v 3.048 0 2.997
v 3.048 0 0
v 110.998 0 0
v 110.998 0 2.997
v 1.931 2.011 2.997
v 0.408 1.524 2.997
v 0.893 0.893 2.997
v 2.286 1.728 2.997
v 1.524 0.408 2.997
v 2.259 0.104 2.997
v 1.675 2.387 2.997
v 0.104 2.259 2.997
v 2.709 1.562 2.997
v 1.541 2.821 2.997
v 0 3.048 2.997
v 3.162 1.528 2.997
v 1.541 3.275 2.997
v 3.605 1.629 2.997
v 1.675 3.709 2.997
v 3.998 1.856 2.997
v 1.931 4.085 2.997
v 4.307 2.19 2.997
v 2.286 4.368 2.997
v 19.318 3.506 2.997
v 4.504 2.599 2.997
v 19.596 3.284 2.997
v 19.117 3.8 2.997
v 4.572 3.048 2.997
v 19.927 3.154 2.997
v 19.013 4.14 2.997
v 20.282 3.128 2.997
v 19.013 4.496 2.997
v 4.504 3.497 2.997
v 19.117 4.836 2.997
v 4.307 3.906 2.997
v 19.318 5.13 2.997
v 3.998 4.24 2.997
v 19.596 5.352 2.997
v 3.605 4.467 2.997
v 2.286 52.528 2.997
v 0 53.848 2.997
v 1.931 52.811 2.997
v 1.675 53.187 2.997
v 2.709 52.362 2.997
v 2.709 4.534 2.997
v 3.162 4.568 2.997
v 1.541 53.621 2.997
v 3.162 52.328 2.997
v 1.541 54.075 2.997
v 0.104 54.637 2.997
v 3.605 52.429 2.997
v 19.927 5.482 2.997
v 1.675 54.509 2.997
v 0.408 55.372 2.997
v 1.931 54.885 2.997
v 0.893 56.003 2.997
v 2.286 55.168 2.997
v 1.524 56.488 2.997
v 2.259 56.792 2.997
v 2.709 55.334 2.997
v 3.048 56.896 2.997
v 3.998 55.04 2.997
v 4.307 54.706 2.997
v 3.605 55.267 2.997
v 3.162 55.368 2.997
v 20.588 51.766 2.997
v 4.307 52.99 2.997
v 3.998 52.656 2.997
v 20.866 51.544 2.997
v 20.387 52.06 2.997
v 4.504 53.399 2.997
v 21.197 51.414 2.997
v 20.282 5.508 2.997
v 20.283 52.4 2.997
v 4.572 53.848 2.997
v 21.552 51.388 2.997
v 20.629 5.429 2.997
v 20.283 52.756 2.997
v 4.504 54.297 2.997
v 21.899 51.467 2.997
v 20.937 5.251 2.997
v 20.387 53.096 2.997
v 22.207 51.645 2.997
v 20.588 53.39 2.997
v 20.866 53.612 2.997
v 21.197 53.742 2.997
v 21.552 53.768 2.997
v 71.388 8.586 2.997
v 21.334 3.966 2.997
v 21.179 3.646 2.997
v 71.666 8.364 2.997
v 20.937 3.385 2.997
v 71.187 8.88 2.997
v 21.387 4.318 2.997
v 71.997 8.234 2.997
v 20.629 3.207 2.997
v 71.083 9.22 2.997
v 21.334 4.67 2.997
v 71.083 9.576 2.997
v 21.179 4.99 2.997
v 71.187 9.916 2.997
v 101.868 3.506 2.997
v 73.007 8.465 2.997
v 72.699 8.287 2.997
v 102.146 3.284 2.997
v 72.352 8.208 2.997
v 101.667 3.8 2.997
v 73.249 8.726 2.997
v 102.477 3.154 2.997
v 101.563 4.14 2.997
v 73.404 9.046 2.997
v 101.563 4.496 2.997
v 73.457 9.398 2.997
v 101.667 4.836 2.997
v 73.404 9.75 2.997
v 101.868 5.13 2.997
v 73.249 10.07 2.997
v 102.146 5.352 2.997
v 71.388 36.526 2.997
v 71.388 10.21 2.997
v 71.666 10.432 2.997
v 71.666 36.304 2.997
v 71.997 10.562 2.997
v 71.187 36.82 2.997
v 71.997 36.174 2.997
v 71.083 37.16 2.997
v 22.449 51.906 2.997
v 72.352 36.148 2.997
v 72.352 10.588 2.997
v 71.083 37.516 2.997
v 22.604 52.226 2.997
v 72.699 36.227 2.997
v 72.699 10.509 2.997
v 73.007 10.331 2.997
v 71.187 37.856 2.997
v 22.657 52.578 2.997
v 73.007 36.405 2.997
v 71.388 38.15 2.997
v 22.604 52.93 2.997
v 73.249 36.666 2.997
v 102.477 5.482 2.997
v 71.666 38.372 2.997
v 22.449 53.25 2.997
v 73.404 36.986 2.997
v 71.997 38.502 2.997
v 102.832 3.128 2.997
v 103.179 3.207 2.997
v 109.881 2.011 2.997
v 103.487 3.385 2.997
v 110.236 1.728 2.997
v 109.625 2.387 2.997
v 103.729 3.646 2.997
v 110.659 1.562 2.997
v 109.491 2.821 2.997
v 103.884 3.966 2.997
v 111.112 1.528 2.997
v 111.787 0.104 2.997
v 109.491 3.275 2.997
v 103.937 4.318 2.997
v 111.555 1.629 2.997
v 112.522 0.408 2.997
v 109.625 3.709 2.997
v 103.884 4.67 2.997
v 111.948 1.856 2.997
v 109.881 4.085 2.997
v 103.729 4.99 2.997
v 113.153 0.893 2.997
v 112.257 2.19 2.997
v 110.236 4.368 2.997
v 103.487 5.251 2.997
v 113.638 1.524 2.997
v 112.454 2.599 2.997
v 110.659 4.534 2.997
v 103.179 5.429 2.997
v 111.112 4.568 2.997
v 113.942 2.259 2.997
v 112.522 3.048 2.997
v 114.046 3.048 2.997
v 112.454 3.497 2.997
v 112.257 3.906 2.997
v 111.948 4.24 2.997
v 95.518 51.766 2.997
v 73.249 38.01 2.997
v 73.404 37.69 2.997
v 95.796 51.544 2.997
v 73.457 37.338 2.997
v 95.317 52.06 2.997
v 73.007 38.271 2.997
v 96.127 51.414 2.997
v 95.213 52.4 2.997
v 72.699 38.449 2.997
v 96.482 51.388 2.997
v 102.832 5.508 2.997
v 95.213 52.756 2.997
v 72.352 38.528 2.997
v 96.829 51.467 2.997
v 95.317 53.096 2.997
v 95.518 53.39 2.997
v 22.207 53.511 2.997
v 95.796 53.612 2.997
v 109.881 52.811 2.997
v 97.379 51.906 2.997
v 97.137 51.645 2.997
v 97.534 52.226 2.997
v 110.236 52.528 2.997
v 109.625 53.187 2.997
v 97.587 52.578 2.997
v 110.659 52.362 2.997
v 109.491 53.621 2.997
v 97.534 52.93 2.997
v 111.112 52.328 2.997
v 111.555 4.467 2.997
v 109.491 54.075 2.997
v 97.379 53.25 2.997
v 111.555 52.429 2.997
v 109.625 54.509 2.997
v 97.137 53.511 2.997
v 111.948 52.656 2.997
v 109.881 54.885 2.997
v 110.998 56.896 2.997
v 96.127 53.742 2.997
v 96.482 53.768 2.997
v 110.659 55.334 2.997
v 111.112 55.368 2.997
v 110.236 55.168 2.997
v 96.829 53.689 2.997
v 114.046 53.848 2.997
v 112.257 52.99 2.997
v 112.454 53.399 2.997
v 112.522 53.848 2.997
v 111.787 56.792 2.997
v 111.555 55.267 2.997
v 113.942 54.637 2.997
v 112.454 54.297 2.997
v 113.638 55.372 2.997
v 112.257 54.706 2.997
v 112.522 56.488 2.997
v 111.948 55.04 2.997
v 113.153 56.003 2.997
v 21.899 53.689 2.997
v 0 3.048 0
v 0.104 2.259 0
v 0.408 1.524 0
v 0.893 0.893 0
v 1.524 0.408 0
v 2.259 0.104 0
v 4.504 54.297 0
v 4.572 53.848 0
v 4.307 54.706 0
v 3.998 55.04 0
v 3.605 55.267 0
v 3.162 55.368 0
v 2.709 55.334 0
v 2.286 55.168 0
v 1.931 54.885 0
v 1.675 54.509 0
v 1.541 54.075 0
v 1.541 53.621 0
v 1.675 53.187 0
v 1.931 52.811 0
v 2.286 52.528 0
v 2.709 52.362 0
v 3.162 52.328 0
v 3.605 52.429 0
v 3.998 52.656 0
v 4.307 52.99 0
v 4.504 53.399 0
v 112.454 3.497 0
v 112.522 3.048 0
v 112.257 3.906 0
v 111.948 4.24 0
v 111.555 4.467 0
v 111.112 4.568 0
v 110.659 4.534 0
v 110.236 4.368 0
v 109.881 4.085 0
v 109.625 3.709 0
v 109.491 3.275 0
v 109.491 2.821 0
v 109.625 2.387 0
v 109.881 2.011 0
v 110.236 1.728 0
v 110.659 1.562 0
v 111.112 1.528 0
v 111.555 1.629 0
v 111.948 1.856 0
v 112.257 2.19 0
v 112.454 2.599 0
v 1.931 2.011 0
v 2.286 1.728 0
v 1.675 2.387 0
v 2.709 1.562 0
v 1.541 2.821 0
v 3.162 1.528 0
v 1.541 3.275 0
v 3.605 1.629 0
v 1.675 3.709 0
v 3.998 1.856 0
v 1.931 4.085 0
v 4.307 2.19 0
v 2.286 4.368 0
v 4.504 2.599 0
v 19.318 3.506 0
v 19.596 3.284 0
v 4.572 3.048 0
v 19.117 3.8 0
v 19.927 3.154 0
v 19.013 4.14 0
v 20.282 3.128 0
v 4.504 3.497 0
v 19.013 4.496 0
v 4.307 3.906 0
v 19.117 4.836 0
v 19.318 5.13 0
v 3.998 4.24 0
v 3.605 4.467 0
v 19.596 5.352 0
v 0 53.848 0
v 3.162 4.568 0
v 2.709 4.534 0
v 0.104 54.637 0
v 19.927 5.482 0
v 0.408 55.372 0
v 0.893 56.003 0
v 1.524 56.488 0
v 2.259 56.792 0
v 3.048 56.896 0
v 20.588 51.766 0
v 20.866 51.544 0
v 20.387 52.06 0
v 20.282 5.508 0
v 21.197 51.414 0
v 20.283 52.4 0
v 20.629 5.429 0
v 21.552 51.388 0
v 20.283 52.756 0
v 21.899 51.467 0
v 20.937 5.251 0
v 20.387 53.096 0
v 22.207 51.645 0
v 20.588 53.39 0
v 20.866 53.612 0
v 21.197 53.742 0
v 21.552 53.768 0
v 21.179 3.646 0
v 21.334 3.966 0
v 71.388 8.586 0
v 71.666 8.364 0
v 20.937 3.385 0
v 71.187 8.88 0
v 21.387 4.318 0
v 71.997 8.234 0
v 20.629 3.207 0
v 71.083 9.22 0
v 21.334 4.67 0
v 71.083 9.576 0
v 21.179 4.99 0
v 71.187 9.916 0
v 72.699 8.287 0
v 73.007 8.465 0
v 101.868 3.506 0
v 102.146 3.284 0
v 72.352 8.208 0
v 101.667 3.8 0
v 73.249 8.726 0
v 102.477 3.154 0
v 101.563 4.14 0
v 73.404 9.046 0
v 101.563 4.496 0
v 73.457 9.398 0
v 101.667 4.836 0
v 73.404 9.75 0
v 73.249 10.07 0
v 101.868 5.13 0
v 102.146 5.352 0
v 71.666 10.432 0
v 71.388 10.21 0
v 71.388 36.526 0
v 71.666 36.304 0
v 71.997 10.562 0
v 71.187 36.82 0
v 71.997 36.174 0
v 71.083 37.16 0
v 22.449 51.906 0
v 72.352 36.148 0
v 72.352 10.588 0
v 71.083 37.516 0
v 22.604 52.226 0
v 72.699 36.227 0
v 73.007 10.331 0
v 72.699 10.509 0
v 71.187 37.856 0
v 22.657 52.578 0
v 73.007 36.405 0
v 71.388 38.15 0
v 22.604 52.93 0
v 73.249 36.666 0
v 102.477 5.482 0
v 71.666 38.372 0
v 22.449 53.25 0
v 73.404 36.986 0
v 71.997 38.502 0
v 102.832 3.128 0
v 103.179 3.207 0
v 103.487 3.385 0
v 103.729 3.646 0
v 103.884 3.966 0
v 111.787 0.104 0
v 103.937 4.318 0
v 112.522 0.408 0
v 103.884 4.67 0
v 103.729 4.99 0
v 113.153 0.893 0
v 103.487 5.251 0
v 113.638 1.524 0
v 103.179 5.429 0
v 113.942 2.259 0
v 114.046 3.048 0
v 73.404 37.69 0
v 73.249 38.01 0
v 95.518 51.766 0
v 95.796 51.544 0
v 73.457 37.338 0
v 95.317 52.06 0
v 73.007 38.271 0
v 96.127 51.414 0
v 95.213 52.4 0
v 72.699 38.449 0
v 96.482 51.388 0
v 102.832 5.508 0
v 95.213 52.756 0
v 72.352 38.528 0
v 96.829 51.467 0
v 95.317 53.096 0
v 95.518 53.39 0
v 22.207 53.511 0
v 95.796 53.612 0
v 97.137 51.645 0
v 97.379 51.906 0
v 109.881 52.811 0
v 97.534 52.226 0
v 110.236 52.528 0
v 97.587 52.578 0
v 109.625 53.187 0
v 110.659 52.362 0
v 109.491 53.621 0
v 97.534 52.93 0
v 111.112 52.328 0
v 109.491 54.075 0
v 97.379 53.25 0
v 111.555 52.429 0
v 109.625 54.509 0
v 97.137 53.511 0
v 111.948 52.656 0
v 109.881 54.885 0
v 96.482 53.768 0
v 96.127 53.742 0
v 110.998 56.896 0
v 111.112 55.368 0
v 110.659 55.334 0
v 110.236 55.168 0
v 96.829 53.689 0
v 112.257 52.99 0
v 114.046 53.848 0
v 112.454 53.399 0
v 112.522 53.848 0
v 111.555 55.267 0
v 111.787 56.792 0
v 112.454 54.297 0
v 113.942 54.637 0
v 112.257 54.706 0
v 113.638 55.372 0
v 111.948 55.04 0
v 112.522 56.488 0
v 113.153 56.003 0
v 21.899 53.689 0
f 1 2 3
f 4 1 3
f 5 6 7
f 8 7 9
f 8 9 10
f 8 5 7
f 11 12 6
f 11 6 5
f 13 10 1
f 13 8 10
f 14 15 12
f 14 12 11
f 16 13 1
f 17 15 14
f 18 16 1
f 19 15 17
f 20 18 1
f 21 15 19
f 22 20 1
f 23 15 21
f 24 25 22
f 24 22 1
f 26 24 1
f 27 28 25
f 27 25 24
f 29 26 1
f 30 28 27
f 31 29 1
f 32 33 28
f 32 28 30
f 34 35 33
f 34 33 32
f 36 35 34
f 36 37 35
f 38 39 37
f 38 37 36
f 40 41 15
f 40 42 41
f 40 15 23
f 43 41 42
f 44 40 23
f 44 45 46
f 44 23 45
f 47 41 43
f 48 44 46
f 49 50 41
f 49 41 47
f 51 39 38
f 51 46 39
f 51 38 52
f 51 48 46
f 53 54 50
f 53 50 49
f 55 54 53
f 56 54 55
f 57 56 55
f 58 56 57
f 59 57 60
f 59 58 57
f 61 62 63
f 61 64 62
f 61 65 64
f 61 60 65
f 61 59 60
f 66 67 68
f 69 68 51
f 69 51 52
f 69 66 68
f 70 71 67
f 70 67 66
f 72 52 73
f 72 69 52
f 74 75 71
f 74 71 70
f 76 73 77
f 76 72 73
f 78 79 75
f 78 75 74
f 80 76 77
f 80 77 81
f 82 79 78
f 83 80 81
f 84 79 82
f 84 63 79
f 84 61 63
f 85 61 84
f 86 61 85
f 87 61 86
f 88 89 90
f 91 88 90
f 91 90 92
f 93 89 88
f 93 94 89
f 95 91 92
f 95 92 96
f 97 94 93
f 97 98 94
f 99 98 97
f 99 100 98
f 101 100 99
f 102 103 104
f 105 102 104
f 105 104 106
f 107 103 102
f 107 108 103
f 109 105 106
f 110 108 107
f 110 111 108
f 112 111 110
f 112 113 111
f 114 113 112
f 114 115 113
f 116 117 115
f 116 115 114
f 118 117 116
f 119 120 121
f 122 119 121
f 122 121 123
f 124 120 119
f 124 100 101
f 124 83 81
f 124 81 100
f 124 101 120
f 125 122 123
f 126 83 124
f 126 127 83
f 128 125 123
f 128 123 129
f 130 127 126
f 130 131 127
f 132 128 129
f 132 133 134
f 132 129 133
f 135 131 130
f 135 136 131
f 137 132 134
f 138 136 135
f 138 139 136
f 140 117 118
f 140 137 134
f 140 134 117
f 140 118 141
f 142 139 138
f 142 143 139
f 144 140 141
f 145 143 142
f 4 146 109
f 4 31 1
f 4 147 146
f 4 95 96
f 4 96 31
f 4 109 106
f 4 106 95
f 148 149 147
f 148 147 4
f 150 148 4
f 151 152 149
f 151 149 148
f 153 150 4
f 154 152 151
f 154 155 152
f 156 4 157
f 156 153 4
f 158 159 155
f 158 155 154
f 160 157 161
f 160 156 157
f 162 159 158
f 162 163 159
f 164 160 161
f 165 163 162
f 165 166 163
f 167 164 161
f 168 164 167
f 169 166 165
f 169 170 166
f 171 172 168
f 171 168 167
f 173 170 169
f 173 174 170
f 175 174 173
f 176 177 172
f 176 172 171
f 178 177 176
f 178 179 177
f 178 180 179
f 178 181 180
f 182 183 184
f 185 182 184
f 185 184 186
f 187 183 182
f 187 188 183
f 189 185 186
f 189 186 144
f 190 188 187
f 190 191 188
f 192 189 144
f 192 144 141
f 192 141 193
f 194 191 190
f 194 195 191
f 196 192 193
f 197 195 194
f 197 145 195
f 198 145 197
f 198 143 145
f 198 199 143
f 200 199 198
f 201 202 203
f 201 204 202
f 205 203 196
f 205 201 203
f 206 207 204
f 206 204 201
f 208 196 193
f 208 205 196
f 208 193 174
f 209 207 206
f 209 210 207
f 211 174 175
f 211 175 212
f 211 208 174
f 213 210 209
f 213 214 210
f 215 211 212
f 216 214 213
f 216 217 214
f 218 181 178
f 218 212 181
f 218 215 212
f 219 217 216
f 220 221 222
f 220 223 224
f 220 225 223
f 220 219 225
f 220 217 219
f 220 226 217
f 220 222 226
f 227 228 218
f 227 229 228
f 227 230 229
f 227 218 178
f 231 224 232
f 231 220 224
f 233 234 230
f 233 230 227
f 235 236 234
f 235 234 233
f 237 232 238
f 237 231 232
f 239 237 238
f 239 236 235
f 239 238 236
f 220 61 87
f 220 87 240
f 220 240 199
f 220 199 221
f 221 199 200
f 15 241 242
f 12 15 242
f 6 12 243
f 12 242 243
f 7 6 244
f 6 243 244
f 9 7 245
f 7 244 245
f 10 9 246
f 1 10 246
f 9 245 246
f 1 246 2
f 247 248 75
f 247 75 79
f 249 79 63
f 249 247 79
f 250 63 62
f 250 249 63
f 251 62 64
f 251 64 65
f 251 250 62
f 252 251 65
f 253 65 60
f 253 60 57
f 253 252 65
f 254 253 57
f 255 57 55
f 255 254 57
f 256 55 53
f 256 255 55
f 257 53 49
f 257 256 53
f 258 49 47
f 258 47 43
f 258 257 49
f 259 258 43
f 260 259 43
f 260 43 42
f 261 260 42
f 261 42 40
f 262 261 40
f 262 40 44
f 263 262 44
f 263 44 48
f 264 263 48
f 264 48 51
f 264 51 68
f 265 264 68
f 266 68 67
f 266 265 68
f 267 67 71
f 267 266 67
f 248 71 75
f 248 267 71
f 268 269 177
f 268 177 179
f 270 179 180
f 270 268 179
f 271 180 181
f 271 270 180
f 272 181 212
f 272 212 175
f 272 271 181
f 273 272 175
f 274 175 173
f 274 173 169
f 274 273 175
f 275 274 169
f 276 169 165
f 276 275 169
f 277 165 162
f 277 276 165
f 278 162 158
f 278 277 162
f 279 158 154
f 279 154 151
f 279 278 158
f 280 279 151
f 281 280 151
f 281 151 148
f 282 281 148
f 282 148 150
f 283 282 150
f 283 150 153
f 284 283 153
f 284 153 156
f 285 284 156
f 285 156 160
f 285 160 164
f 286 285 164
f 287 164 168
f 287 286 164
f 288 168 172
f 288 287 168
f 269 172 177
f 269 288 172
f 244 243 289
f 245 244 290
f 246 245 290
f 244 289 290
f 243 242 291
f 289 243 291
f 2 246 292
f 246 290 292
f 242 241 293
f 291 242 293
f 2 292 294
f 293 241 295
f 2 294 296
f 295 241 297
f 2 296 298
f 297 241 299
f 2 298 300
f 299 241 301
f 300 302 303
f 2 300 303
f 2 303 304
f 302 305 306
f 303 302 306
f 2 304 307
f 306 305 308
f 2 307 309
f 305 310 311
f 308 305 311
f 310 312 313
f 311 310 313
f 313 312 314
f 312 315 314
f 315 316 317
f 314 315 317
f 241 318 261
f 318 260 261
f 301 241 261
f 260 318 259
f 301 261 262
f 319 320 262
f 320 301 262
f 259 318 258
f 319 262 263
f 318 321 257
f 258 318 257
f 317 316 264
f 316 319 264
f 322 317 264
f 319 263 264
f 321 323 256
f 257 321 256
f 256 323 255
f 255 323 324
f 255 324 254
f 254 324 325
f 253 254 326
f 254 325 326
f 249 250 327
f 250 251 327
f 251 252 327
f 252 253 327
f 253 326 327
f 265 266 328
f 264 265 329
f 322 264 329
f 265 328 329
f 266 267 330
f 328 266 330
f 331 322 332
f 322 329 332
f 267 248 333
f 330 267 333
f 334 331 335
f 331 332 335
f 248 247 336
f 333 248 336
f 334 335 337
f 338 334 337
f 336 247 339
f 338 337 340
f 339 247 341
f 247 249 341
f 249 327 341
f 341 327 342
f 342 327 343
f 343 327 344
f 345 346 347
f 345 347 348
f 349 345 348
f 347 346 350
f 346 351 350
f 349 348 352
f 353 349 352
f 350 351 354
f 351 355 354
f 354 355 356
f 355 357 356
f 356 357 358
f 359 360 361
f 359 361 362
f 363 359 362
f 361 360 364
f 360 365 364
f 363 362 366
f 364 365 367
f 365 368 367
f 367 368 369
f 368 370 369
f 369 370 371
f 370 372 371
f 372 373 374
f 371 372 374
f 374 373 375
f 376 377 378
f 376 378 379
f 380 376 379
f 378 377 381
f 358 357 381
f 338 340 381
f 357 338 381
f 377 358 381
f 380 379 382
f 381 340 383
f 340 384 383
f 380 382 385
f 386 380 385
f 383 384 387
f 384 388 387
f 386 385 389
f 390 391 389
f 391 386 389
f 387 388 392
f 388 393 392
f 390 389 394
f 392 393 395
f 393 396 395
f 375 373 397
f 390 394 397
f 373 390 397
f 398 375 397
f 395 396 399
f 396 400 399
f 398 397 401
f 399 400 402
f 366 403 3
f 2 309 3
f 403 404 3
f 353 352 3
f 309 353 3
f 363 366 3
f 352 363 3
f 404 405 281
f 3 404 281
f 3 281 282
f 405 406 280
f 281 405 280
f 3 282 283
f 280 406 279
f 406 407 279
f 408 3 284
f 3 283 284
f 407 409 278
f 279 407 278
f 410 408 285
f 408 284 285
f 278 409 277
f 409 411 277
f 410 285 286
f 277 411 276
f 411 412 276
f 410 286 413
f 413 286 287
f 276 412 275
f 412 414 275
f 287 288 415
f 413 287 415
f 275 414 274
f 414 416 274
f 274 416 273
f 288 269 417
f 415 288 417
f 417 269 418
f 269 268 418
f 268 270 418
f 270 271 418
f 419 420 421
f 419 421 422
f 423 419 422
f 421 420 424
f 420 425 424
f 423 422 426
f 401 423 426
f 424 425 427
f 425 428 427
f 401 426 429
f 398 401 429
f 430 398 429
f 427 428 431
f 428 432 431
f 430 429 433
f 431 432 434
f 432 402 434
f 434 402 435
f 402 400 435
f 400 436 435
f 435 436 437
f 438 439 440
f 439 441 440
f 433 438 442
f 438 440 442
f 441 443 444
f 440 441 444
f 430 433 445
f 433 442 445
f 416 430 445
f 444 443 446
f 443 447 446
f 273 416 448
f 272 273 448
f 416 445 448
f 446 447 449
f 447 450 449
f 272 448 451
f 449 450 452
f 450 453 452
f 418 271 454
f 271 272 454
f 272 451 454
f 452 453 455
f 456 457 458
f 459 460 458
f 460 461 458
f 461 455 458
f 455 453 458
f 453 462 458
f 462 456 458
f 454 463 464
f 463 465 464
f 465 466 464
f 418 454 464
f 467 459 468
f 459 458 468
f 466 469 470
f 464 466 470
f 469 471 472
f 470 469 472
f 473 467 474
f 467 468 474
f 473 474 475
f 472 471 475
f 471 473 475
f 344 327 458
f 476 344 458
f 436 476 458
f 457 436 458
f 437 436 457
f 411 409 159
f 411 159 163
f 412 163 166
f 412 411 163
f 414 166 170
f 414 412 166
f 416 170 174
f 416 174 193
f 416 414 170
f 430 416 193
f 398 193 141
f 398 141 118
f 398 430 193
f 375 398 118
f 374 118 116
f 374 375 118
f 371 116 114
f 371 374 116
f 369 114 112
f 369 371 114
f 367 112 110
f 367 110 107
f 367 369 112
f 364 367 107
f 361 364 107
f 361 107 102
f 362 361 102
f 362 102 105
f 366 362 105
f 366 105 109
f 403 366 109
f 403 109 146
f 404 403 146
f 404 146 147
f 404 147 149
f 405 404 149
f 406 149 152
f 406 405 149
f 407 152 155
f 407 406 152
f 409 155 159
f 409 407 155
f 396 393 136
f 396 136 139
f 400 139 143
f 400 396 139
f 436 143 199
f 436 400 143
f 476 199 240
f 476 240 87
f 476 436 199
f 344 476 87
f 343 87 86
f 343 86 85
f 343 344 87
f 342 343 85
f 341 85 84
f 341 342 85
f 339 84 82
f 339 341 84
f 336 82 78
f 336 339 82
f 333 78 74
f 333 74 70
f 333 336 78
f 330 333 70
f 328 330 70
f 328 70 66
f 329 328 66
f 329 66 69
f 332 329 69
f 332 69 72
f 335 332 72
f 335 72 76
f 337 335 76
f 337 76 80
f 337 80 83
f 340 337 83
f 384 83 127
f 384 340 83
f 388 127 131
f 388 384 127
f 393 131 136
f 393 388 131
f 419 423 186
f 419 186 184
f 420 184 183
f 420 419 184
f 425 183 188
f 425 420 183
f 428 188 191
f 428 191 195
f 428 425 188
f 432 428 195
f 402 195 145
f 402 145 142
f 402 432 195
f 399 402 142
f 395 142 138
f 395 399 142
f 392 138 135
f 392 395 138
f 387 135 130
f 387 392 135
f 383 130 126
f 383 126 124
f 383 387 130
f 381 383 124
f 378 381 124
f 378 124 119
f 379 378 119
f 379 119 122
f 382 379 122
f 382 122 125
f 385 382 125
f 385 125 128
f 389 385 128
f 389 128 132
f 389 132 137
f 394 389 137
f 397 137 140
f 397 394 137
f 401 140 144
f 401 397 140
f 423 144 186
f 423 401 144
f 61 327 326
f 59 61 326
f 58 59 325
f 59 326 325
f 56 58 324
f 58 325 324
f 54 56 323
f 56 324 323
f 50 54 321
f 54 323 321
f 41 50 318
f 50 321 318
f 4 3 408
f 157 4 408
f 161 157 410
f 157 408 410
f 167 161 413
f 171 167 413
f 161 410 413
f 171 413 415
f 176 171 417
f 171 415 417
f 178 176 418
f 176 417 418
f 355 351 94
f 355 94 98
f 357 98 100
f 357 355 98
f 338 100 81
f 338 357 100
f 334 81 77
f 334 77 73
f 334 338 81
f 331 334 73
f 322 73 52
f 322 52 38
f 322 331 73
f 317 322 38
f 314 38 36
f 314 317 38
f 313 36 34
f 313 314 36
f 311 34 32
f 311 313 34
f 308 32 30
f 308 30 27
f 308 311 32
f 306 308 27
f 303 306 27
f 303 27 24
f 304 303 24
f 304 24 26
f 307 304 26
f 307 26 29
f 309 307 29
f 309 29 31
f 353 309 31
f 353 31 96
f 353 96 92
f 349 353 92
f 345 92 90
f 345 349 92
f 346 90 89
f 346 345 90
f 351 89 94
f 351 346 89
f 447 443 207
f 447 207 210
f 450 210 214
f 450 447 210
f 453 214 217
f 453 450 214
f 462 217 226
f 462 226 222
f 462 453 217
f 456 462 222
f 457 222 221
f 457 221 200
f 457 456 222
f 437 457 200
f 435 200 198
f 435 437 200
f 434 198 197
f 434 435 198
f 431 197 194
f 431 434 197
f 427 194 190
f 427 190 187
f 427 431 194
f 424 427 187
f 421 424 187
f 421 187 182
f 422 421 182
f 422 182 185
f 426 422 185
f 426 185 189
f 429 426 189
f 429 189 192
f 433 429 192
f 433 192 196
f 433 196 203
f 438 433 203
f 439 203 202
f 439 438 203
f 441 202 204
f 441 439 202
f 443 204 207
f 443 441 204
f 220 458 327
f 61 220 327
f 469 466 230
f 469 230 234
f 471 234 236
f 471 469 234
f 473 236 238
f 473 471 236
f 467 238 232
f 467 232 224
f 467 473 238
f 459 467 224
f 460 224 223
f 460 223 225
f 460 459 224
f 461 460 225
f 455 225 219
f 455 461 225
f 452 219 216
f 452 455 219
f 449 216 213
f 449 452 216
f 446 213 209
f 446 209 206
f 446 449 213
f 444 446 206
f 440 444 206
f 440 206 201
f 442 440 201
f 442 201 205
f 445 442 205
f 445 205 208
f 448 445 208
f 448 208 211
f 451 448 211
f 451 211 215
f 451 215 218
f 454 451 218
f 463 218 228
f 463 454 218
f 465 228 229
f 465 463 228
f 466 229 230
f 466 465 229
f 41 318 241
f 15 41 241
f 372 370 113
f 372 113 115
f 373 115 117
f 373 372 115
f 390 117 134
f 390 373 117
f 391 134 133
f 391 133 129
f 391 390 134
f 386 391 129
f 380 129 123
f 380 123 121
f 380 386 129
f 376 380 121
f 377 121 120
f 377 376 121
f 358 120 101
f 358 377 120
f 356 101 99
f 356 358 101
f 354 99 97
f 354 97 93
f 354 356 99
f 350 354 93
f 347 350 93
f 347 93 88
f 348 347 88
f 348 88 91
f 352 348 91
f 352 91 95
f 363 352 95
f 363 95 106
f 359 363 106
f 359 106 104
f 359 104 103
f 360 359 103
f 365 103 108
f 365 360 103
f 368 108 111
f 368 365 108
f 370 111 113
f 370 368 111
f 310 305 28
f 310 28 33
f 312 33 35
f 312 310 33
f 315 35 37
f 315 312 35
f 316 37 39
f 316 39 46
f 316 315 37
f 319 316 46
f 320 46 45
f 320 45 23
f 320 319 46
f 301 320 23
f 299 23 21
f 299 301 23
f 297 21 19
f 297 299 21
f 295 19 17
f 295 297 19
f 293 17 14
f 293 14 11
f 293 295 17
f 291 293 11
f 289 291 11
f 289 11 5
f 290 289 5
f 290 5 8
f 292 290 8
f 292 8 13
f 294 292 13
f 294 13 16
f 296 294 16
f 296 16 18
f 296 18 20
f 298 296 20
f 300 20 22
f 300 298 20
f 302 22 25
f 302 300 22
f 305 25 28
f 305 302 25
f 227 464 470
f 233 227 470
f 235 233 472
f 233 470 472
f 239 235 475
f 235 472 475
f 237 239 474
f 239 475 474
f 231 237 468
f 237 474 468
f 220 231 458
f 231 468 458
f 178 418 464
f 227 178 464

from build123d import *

# Parameters (mm, degrees)
F0_R     = 1.524
F0_R_2   = 1.1938
F1_DEPTH = 2.9972


with BuildPart() as f1:
    # F0 (on Top) → F1 (new body)
    with BuildSketch(Plane.XY):
        with BuildLine():
            ThreePointArc((0, 3.048), (0.892739, 0.892739), (3.048, 0))
            Line((3.048, 0), (110.998, 0))
            ThreePointArc((110.998, 0), (113.153261, 0.892739), (114.046, 3.048))
            Line((114.046, 3.048), (114.046, 53.848))
            ThreePointArc((114.046, 53.848), (113.153261, 56.003261), (110.998, 56.896))
            Line((110.998, 56.896), (3.048, 56.896))
            ThreePointArc((3.048, 56.896), (0.892739, 56.003261), (0, 53.848))
            Line((0, 53.848), (0, 3.048))
        make_face()
        with Locations((3.048, 3.048)):
            Circle(F0_R, mode=Mode.SUBTRACT)
        with Locations((20.193, 4.318)):
            Circle(F0_R_2, mode=Mode.SUBTRACT)
        with Locations((72.263, 9.398)):
            Circle(F0_R_2, mode=Mode.SUBTRACT)
        with Locations((110.998, 3.048)):
            Circle(F0_R, mode=Mode.SUBTRACT)
        with Locations((102.743, 4.318)):
            Circle(F0_R_2, mode=Mode.SUBTRACT)
        with Locations((3.048, 53.848)):
            Circle(F0_R, mode=Mode.SUBTRACT)
        with Locations((21.463, 52.578)):
            Circle(F0_R_2, mode=Mode.SUBTRACT)
        with Locations((72.263, 37.338)):
            Circle(F0_R_2, mode=Mode.SUBTRACT)
        with Locations((96.393, 52.578)):
            Circle(F0_R_2, mode=Mode.SUBTRACT)
        with Locations((110.998, 53.848)):
            Circle(F0_R, mode=Mode.SUBTRACT)
    extrude(amount=F1_DEPTH)


solid = f1.part
